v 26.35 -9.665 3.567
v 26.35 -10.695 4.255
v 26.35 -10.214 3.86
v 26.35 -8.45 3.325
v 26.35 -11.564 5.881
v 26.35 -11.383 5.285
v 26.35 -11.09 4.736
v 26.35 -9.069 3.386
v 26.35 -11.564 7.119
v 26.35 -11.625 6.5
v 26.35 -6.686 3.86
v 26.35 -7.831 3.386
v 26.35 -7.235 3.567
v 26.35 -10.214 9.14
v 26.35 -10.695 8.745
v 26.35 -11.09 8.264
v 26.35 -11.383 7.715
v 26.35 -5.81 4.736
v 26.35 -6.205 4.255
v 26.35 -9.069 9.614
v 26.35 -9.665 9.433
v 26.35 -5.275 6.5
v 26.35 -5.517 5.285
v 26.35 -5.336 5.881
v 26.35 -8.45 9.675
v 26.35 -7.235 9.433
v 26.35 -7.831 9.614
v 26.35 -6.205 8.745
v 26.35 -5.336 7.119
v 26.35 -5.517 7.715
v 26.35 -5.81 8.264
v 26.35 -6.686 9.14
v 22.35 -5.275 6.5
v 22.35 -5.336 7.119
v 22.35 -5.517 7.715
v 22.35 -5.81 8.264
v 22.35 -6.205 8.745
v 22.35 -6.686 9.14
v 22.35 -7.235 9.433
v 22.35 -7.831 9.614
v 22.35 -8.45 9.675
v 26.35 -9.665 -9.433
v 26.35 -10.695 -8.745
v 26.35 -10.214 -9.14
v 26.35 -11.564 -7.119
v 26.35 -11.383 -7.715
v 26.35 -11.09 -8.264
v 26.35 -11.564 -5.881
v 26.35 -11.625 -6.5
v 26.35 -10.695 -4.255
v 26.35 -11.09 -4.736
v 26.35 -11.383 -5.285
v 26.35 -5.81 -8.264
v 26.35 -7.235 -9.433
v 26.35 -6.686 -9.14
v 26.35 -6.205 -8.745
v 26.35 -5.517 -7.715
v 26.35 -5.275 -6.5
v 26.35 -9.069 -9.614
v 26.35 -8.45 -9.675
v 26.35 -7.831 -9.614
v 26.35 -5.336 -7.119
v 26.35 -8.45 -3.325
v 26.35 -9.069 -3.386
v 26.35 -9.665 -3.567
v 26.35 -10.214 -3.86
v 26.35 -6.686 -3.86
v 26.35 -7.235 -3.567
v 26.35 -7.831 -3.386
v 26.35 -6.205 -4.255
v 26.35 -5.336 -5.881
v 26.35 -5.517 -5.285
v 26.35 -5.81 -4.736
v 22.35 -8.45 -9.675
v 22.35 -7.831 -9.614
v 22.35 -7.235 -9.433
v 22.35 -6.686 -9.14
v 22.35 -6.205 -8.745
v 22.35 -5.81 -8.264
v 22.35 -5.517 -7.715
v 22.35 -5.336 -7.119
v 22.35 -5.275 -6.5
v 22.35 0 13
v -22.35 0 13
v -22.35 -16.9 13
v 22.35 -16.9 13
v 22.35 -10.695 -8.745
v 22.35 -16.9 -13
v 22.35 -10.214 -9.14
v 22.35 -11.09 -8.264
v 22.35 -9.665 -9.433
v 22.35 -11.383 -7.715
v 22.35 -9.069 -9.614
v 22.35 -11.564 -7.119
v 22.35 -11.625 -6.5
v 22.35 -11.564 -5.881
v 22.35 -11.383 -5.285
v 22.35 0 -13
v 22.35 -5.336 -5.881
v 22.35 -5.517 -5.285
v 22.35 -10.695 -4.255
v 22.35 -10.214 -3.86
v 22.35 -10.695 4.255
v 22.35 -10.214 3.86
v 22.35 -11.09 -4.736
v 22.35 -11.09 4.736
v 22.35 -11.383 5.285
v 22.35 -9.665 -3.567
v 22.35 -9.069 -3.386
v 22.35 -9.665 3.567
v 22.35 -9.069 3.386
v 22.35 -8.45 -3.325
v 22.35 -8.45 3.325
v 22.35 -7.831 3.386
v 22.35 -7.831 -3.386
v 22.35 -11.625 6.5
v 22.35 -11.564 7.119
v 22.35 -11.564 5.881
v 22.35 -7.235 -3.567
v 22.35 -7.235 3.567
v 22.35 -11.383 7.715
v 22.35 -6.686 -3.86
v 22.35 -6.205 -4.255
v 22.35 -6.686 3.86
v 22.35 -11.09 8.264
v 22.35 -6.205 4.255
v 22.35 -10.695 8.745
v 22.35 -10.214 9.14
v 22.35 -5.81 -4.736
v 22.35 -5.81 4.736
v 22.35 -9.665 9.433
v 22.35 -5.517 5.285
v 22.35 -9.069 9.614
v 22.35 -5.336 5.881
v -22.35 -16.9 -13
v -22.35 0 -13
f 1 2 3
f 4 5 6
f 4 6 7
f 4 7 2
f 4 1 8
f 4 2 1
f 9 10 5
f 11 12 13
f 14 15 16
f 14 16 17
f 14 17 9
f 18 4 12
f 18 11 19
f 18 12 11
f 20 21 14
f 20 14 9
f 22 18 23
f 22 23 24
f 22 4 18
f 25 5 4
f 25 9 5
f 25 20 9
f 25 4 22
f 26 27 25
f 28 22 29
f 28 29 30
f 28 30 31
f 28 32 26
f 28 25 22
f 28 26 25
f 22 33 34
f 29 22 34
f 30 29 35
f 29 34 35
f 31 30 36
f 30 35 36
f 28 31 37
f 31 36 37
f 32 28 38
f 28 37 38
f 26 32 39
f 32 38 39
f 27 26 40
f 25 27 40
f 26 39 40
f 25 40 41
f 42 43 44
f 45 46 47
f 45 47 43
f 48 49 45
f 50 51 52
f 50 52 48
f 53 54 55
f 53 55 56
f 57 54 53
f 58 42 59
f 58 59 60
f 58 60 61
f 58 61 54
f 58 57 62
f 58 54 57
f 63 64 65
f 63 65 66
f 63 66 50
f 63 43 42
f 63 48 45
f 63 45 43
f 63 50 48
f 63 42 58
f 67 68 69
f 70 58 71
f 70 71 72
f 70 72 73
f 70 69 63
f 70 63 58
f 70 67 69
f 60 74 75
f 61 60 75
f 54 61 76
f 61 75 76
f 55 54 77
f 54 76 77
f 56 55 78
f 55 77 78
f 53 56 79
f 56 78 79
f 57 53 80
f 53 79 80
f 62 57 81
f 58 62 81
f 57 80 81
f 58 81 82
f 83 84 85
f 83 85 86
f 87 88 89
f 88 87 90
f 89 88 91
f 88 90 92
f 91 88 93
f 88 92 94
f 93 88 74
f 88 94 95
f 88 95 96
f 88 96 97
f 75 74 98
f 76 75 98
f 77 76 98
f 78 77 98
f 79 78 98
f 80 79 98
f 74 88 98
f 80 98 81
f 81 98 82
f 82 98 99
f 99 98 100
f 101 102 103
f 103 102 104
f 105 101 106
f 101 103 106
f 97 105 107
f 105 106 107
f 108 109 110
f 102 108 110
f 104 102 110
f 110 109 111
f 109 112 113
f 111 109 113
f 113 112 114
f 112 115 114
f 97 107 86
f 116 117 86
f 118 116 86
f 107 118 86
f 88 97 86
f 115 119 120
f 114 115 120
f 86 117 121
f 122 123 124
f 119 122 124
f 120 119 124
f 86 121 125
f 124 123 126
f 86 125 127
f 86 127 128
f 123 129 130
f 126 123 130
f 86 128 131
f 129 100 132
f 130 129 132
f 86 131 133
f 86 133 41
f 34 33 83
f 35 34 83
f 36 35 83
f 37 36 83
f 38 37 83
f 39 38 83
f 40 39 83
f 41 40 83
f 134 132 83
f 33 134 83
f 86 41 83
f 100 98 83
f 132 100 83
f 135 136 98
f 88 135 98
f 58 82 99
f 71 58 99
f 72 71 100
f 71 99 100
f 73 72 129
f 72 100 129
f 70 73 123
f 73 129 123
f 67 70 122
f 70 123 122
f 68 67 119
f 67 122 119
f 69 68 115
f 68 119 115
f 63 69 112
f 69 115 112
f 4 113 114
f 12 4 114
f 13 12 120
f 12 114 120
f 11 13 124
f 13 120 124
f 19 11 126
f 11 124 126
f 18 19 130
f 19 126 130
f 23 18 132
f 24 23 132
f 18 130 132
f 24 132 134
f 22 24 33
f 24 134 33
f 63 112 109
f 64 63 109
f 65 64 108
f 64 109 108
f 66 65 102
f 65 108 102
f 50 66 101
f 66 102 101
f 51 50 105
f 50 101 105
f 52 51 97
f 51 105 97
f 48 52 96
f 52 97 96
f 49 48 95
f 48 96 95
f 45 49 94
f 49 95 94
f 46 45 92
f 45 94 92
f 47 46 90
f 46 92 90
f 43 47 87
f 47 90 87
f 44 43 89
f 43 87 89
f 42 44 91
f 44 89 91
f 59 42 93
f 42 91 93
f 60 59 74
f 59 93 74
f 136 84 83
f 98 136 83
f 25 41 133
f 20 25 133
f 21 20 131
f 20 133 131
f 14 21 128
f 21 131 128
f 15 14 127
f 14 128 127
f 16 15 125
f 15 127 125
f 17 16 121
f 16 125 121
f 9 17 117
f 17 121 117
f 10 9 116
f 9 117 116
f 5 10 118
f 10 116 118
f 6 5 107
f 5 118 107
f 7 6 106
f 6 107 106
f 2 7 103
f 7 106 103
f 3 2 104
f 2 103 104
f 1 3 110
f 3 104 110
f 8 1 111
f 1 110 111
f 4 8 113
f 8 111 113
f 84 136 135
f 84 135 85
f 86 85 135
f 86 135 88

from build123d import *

# Parameters (mm, degrees)
F0_W     = 44.7
F0_H     = 26
F1_DEPTH = 16.9
F3_DEPTH = 4


with BuildPart() as f1:
    # F0 (on Front) → F1 (new body)
    with BuildSketch(Plane.XZ):
        Rectangle(F0_W, F0_H)
    extrude(amount=F1_DEPTH)

    # F2 (on face) → F3 (join)
    with BuildSketch(Plane.YZ.offset(22.35)):
        with BuildLine():
            ThreePointArc((-8.45, -3.325), (-11.625, -6.5), (-8.45, -9.675))
            Line((-8.45, -9.675), (-8.45, -3.325))
        make_face()
        with BuildLine():
            Line((-8.45, -3.325), (-8.45, -9.675))
            ThreePointArc((-8.45, -9.675), (-6.2049359697, -8.7450640303), (-5.275, -6.5))
            ThreePointArc((-5.275, -6.5), (-6.2049359697, -4.2549359697), (-8.45, -3.325))
        make_face()
        with BuildLine():
            ThreePointArc((-8.45, 9.675), (-11.625, 6.5), (-8.45, 3.325))
            Line((-8.45, 3.325), (-8.45, 6.5))
            Line((-8.45, 6.5), (-8.45, 9.675))
        make_face()
        with BuildLine():
            Line((-8.45, 6.5), (-8.45, 3.325))
            ThreePointArc((-8.45, 3.325), (-6.2049359697, 4.2549359697), (-5.275, 6.5))
            ThreePointArc((-5.275, 6.5), (-6.2049359697, 8.7450640303), (-8.45, 9.675))
            Line((-8.45, 9.675), (-8.45, 6.5))
        make_face()
    extrude(amount=F3_DEPTH)


solid = f1.part
